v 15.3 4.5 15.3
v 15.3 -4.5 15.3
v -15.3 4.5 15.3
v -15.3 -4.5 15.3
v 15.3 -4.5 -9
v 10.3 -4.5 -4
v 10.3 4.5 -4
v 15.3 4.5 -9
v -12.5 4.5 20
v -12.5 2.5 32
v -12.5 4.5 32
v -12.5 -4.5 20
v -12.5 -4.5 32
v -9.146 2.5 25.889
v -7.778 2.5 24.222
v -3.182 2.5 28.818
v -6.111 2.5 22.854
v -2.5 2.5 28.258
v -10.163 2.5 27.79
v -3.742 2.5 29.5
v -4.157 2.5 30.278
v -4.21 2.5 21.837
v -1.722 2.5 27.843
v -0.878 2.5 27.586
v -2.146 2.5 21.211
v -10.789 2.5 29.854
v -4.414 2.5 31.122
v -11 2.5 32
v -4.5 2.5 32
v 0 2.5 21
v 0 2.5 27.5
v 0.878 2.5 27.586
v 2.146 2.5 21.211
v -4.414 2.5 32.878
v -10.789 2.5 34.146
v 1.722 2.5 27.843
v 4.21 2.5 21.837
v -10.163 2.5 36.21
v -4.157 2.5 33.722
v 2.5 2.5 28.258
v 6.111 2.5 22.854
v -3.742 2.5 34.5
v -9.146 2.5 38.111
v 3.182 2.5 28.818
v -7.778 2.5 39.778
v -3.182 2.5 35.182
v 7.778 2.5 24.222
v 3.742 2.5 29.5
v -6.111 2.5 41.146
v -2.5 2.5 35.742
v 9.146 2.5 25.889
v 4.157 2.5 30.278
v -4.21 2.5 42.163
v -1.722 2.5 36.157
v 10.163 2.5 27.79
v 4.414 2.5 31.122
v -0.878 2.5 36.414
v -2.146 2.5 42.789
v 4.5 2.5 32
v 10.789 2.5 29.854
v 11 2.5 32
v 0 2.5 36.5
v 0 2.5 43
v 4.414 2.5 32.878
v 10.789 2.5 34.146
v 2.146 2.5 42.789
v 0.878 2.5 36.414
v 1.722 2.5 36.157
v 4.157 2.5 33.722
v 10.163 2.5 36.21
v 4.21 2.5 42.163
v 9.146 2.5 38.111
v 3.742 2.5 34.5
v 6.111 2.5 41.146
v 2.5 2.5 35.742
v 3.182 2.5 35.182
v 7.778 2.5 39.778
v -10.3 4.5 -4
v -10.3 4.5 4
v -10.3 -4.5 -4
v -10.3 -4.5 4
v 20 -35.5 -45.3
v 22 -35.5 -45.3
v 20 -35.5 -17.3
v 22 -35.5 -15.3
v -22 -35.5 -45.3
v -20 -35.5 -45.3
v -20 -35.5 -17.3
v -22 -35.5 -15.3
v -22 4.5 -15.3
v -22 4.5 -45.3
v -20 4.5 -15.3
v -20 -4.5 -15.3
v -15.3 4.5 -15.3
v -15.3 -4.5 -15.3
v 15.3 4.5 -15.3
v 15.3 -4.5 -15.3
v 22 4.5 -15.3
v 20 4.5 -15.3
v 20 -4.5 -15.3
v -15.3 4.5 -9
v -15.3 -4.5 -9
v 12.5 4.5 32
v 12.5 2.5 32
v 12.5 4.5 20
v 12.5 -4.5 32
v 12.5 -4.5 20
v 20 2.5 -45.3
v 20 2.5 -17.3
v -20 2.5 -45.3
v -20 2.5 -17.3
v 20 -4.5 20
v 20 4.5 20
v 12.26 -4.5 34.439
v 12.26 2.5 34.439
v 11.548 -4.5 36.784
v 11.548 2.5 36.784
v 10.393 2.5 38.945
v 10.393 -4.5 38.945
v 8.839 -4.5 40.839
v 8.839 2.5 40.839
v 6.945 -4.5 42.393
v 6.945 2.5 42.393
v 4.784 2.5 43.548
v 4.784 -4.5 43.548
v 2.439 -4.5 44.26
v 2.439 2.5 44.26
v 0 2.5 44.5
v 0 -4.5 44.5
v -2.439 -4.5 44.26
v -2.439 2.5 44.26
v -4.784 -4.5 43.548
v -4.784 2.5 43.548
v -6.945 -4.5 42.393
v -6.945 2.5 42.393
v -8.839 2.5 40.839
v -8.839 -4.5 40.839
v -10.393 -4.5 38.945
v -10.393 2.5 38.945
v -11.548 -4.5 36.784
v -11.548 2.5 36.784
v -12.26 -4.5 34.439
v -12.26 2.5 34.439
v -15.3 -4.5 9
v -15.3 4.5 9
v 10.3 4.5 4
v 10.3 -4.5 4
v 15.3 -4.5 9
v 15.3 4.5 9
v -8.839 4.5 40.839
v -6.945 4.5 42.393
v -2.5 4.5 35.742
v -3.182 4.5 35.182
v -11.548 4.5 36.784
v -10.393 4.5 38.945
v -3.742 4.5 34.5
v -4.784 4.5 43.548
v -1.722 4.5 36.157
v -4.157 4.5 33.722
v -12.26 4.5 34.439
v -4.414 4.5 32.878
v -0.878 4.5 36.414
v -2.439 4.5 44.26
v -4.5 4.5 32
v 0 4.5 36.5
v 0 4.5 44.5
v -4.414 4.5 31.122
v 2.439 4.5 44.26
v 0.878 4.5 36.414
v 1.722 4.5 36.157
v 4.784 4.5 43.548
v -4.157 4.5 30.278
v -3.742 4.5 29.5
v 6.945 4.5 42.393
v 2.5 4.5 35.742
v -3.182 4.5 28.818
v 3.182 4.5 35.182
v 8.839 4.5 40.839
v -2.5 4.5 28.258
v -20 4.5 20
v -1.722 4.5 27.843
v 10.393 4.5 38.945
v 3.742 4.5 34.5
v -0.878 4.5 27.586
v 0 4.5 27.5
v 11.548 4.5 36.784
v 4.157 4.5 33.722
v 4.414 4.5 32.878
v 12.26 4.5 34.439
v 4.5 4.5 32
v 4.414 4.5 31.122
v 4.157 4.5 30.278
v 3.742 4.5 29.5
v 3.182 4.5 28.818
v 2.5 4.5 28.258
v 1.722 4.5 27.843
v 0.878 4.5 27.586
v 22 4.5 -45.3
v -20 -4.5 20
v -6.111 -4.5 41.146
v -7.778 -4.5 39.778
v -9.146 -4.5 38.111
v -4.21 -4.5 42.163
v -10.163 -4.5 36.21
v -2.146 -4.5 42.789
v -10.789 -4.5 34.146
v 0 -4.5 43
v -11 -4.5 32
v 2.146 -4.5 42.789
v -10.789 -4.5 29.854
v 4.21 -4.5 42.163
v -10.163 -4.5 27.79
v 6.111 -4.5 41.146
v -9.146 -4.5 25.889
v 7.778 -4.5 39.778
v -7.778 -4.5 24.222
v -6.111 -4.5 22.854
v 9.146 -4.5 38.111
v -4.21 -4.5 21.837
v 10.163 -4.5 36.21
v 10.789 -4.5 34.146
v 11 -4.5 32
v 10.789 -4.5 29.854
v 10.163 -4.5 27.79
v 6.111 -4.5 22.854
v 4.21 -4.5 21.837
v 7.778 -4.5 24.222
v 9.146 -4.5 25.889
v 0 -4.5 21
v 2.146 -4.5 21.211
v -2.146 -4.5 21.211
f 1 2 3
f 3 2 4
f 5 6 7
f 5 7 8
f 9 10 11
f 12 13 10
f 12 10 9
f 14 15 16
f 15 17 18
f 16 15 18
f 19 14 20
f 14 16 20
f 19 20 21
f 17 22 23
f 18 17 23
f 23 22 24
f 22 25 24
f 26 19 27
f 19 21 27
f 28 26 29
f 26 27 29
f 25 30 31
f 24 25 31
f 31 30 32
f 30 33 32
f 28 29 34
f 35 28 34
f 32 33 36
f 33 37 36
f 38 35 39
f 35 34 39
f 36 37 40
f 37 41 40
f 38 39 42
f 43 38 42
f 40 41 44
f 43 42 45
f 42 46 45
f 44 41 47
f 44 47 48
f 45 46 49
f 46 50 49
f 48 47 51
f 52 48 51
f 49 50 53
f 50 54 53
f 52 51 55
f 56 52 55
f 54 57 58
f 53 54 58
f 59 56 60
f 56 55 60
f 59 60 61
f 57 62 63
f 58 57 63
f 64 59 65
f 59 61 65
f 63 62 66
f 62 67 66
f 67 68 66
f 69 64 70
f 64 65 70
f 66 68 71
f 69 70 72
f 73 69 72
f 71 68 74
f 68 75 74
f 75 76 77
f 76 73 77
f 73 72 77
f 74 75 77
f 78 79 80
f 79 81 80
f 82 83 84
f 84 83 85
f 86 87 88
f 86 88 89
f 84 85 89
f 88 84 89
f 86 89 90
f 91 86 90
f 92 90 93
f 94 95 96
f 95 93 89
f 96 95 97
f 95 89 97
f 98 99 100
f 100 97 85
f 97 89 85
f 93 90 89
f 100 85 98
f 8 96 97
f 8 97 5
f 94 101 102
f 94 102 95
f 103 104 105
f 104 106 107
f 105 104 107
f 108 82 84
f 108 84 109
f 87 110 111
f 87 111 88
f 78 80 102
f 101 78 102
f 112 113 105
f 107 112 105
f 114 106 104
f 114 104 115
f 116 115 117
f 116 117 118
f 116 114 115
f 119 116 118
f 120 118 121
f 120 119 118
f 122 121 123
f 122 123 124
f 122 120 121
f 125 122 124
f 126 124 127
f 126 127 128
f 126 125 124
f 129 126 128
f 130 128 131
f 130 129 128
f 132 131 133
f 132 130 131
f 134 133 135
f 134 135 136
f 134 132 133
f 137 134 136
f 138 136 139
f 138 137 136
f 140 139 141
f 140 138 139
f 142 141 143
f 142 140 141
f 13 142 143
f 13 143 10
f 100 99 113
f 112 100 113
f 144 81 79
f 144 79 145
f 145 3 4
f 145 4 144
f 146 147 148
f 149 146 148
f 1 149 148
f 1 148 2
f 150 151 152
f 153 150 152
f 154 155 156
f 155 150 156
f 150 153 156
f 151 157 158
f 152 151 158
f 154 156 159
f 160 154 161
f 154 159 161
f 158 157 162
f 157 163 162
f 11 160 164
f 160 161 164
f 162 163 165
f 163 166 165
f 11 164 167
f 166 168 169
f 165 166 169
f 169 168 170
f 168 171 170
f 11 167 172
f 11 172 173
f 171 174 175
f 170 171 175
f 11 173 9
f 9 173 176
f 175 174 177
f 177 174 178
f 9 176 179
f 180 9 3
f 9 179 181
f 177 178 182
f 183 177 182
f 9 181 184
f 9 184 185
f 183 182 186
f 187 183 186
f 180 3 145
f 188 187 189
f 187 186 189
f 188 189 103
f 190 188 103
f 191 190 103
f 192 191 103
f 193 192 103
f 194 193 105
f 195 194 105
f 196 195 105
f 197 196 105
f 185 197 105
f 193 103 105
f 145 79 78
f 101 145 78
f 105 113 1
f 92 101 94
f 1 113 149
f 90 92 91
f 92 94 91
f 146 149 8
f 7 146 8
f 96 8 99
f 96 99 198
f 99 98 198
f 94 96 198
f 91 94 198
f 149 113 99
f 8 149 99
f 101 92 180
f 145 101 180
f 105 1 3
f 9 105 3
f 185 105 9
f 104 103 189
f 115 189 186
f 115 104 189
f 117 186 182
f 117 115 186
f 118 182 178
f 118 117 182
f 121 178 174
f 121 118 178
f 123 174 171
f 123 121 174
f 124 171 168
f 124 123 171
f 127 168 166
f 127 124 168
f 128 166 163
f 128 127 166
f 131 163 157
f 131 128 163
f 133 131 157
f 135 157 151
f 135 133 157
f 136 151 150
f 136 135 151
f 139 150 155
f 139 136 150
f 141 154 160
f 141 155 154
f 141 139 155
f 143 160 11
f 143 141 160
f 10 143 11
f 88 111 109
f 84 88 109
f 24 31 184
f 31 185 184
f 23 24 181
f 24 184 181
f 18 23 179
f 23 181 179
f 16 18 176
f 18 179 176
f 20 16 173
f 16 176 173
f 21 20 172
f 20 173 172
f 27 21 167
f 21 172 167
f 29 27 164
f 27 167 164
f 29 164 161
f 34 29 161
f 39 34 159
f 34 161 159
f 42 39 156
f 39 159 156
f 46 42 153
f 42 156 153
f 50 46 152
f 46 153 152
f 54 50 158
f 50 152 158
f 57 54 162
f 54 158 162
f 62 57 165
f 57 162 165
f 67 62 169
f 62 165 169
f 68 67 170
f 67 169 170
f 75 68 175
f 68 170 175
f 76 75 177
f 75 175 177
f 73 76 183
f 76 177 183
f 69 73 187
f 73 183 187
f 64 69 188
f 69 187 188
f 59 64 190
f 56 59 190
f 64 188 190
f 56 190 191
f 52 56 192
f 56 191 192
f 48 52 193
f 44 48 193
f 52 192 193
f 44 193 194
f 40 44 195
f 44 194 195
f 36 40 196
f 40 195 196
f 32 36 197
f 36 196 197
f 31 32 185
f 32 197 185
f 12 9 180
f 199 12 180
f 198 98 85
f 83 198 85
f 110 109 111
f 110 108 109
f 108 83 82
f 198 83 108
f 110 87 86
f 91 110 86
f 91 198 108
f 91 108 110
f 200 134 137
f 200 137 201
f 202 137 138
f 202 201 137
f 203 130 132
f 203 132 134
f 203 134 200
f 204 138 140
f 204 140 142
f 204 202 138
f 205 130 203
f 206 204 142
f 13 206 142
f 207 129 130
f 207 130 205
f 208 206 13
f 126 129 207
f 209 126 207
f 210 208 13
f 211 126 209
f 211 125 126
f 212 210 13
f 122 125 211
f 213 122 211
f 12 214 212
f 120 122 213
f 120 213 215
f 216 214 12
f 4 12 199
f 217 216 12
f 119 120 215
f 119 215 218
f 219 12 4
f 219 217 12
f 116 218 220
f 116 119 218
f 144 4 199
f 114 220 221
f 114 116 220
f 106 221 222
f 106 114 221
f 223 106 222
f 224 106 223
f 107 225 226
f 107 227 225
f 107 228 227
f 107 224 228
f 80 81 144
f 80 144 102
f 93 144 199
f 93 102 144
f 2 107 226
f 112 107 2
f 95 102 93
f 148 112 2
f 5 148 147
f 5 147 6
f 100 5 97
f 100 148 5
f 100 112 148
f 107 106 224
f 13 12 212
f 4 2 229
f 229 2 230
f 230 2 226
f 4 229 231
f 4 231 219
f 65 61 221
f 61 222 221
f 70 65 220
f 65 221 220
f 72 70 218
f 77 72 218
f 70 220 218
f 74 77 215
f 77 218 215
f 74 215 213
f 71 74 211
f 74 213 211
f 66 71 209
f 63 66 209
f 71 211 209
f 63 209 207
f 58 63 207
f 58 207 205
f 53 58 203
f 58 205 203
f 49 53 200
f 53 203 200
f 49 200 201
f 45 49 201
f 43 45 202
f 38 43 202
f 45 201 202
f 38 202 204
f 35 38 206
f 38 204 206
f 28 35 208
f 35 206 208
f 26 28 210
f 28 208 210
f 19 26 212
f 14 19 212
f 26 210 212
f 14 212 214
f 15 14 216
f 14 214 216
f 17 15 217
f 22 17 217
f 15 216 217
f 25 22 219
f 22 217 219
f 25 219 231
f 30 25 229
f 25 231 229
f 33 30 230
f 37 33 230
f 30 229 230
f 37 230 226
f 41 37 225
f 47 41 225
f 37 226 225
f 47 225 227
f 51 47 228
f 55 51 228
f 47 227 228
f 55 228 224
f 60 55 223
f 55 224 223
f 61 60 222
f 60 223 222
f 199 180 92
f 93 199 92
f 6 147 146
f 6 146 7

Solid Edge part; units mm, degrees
sketch "Sketch1" plane through (0, 0, 0) normal (0, -1, 0) x (1, 0, 0)
  line L0 (-20, -20) -> (20, -20)
  line L1 (20, -20) -> (20, 20)
  line L2 (20, 20) -> (-20, 20)
  line L3 (-20, 20) -> (-20, -20)
extrude "Protrusion1" add sketch "Sketch1" along normal mid plane 9
sketch "Sketch2" plane through (0, -4.5, 0) normal (0, -1, 0) x (1, 0, 0)
  line L0 (-15.3, -15.3) -> (15.3, -15.3)
  line L1 (15.3, -15.3) -> (15.3, -9)
  line L2 (10.3, -4) -> (15.3, -9)
  line L3 (10.3, 4) -> (10.3, -4)
  line L4 (10.3, 4) -> (15.3, 9)
  line L5 (15.3, 9) -> (15.3, 15.3)
  line L6 (15.3, 15.3) -> (-15.3, 15.3)
  line L7 (-15.3, 15.3) -> (-15.3, 9)
  line L8 (-10.3, 4) -> (-15.3, 9)
  line L9 (-10.3, 4) -> (-10.3, -4)
  line L10 (-10.3, -4) -> (-15.3, -9)
  line L11 (-15.3, -9) -> (-15.3, -15.3)
extrude "ExtrudedCutout_1" cut sketch "Sketch2" against normal blind 161.5
sketch "Sketch3" plane through (0, -4.5, 2.35) normal (0, -1, 0) x (1, 0, 0)
  line L0 (-12.5, 29.65) -> (-12.5, 17.65)
  line L1 (-12.5, 17.65) -> (12.5, 17.65)
  line L2 (12.5, 29.65) -> (12.5, 17.65)
  arc A0 (12.5, 29.65) -> (-12.5, 29.65) centre (0, 29.65) ccw
extrude "Protrusion2" add sketch "Sketch3" against normal blind 7
sketch "Sketch4" plane through (0, -4.5, 14.6) normal (0, -1, 0) x (1, 0, 0)
  circle A0 centre (0, 17.4) radius 11
extrude "ExtrudedCutout_2" cut sketch "Sketch4" against normal blind 39
sketch "Sketch5" plane through (0, 2.5, 32.25) normal (0, 1, 0) x (0, 0, -1)
  line L0 (0.25, -12.5) -> (12.25, -12.5)
  line L1 (12.25, -12.5) -> (12.25, 12.5)
  line L2 (12.25, 12.5) -> (0.25, 12.5)
  arc A0 (0.25, 12.5) -> (0.25, -12.5) centre (0.25, 0) ccw
extrude "ExtrudedProtrusion_4" add sketch "Sketch5" along normal blind 2
sketch "Sketch6" plane through (0, 4.5, 14.6) normal (0, 1, 0) x (0, 0, -1)
  circle A0 centre (-17.4, 0) radius 4.5
extrude "ExtrudedCutout_3" cut sketch "Sketch6" against normal blind 37
sketch "Sketch7" plane through (0, 0, -15.3) normal (0, 0, 1) x (0, 1, 0)
  line L0 (4.5, 22) -> (4.5, -22)
  line L1 (4.5, -22) -> (-35.5, -22)
  line L2 (-35.5, -22) -> (-35.5, 22)
  line L3 (-35.5, 22) -> (4.5, 22)
  dimension "D1" = 2
extrude "Protrusion3" add sketch "Sketch7" against normal blind 30
sketch "Sketch8" plane through (0, -15.5, -45.3) normal (0, 0, -1) x (1, 0, 0)
  line L0 (-20, 20) -> (20, 20)
  line L1 (20, 20) -> (20, -18)
  line L2 (20, -18) -> (-20, -18)
  line L3 (-20, -18) -> (-20, 20)
extrude "ExtrudedCutout_4" cut sketch "Sketch8" against normal blind 28
